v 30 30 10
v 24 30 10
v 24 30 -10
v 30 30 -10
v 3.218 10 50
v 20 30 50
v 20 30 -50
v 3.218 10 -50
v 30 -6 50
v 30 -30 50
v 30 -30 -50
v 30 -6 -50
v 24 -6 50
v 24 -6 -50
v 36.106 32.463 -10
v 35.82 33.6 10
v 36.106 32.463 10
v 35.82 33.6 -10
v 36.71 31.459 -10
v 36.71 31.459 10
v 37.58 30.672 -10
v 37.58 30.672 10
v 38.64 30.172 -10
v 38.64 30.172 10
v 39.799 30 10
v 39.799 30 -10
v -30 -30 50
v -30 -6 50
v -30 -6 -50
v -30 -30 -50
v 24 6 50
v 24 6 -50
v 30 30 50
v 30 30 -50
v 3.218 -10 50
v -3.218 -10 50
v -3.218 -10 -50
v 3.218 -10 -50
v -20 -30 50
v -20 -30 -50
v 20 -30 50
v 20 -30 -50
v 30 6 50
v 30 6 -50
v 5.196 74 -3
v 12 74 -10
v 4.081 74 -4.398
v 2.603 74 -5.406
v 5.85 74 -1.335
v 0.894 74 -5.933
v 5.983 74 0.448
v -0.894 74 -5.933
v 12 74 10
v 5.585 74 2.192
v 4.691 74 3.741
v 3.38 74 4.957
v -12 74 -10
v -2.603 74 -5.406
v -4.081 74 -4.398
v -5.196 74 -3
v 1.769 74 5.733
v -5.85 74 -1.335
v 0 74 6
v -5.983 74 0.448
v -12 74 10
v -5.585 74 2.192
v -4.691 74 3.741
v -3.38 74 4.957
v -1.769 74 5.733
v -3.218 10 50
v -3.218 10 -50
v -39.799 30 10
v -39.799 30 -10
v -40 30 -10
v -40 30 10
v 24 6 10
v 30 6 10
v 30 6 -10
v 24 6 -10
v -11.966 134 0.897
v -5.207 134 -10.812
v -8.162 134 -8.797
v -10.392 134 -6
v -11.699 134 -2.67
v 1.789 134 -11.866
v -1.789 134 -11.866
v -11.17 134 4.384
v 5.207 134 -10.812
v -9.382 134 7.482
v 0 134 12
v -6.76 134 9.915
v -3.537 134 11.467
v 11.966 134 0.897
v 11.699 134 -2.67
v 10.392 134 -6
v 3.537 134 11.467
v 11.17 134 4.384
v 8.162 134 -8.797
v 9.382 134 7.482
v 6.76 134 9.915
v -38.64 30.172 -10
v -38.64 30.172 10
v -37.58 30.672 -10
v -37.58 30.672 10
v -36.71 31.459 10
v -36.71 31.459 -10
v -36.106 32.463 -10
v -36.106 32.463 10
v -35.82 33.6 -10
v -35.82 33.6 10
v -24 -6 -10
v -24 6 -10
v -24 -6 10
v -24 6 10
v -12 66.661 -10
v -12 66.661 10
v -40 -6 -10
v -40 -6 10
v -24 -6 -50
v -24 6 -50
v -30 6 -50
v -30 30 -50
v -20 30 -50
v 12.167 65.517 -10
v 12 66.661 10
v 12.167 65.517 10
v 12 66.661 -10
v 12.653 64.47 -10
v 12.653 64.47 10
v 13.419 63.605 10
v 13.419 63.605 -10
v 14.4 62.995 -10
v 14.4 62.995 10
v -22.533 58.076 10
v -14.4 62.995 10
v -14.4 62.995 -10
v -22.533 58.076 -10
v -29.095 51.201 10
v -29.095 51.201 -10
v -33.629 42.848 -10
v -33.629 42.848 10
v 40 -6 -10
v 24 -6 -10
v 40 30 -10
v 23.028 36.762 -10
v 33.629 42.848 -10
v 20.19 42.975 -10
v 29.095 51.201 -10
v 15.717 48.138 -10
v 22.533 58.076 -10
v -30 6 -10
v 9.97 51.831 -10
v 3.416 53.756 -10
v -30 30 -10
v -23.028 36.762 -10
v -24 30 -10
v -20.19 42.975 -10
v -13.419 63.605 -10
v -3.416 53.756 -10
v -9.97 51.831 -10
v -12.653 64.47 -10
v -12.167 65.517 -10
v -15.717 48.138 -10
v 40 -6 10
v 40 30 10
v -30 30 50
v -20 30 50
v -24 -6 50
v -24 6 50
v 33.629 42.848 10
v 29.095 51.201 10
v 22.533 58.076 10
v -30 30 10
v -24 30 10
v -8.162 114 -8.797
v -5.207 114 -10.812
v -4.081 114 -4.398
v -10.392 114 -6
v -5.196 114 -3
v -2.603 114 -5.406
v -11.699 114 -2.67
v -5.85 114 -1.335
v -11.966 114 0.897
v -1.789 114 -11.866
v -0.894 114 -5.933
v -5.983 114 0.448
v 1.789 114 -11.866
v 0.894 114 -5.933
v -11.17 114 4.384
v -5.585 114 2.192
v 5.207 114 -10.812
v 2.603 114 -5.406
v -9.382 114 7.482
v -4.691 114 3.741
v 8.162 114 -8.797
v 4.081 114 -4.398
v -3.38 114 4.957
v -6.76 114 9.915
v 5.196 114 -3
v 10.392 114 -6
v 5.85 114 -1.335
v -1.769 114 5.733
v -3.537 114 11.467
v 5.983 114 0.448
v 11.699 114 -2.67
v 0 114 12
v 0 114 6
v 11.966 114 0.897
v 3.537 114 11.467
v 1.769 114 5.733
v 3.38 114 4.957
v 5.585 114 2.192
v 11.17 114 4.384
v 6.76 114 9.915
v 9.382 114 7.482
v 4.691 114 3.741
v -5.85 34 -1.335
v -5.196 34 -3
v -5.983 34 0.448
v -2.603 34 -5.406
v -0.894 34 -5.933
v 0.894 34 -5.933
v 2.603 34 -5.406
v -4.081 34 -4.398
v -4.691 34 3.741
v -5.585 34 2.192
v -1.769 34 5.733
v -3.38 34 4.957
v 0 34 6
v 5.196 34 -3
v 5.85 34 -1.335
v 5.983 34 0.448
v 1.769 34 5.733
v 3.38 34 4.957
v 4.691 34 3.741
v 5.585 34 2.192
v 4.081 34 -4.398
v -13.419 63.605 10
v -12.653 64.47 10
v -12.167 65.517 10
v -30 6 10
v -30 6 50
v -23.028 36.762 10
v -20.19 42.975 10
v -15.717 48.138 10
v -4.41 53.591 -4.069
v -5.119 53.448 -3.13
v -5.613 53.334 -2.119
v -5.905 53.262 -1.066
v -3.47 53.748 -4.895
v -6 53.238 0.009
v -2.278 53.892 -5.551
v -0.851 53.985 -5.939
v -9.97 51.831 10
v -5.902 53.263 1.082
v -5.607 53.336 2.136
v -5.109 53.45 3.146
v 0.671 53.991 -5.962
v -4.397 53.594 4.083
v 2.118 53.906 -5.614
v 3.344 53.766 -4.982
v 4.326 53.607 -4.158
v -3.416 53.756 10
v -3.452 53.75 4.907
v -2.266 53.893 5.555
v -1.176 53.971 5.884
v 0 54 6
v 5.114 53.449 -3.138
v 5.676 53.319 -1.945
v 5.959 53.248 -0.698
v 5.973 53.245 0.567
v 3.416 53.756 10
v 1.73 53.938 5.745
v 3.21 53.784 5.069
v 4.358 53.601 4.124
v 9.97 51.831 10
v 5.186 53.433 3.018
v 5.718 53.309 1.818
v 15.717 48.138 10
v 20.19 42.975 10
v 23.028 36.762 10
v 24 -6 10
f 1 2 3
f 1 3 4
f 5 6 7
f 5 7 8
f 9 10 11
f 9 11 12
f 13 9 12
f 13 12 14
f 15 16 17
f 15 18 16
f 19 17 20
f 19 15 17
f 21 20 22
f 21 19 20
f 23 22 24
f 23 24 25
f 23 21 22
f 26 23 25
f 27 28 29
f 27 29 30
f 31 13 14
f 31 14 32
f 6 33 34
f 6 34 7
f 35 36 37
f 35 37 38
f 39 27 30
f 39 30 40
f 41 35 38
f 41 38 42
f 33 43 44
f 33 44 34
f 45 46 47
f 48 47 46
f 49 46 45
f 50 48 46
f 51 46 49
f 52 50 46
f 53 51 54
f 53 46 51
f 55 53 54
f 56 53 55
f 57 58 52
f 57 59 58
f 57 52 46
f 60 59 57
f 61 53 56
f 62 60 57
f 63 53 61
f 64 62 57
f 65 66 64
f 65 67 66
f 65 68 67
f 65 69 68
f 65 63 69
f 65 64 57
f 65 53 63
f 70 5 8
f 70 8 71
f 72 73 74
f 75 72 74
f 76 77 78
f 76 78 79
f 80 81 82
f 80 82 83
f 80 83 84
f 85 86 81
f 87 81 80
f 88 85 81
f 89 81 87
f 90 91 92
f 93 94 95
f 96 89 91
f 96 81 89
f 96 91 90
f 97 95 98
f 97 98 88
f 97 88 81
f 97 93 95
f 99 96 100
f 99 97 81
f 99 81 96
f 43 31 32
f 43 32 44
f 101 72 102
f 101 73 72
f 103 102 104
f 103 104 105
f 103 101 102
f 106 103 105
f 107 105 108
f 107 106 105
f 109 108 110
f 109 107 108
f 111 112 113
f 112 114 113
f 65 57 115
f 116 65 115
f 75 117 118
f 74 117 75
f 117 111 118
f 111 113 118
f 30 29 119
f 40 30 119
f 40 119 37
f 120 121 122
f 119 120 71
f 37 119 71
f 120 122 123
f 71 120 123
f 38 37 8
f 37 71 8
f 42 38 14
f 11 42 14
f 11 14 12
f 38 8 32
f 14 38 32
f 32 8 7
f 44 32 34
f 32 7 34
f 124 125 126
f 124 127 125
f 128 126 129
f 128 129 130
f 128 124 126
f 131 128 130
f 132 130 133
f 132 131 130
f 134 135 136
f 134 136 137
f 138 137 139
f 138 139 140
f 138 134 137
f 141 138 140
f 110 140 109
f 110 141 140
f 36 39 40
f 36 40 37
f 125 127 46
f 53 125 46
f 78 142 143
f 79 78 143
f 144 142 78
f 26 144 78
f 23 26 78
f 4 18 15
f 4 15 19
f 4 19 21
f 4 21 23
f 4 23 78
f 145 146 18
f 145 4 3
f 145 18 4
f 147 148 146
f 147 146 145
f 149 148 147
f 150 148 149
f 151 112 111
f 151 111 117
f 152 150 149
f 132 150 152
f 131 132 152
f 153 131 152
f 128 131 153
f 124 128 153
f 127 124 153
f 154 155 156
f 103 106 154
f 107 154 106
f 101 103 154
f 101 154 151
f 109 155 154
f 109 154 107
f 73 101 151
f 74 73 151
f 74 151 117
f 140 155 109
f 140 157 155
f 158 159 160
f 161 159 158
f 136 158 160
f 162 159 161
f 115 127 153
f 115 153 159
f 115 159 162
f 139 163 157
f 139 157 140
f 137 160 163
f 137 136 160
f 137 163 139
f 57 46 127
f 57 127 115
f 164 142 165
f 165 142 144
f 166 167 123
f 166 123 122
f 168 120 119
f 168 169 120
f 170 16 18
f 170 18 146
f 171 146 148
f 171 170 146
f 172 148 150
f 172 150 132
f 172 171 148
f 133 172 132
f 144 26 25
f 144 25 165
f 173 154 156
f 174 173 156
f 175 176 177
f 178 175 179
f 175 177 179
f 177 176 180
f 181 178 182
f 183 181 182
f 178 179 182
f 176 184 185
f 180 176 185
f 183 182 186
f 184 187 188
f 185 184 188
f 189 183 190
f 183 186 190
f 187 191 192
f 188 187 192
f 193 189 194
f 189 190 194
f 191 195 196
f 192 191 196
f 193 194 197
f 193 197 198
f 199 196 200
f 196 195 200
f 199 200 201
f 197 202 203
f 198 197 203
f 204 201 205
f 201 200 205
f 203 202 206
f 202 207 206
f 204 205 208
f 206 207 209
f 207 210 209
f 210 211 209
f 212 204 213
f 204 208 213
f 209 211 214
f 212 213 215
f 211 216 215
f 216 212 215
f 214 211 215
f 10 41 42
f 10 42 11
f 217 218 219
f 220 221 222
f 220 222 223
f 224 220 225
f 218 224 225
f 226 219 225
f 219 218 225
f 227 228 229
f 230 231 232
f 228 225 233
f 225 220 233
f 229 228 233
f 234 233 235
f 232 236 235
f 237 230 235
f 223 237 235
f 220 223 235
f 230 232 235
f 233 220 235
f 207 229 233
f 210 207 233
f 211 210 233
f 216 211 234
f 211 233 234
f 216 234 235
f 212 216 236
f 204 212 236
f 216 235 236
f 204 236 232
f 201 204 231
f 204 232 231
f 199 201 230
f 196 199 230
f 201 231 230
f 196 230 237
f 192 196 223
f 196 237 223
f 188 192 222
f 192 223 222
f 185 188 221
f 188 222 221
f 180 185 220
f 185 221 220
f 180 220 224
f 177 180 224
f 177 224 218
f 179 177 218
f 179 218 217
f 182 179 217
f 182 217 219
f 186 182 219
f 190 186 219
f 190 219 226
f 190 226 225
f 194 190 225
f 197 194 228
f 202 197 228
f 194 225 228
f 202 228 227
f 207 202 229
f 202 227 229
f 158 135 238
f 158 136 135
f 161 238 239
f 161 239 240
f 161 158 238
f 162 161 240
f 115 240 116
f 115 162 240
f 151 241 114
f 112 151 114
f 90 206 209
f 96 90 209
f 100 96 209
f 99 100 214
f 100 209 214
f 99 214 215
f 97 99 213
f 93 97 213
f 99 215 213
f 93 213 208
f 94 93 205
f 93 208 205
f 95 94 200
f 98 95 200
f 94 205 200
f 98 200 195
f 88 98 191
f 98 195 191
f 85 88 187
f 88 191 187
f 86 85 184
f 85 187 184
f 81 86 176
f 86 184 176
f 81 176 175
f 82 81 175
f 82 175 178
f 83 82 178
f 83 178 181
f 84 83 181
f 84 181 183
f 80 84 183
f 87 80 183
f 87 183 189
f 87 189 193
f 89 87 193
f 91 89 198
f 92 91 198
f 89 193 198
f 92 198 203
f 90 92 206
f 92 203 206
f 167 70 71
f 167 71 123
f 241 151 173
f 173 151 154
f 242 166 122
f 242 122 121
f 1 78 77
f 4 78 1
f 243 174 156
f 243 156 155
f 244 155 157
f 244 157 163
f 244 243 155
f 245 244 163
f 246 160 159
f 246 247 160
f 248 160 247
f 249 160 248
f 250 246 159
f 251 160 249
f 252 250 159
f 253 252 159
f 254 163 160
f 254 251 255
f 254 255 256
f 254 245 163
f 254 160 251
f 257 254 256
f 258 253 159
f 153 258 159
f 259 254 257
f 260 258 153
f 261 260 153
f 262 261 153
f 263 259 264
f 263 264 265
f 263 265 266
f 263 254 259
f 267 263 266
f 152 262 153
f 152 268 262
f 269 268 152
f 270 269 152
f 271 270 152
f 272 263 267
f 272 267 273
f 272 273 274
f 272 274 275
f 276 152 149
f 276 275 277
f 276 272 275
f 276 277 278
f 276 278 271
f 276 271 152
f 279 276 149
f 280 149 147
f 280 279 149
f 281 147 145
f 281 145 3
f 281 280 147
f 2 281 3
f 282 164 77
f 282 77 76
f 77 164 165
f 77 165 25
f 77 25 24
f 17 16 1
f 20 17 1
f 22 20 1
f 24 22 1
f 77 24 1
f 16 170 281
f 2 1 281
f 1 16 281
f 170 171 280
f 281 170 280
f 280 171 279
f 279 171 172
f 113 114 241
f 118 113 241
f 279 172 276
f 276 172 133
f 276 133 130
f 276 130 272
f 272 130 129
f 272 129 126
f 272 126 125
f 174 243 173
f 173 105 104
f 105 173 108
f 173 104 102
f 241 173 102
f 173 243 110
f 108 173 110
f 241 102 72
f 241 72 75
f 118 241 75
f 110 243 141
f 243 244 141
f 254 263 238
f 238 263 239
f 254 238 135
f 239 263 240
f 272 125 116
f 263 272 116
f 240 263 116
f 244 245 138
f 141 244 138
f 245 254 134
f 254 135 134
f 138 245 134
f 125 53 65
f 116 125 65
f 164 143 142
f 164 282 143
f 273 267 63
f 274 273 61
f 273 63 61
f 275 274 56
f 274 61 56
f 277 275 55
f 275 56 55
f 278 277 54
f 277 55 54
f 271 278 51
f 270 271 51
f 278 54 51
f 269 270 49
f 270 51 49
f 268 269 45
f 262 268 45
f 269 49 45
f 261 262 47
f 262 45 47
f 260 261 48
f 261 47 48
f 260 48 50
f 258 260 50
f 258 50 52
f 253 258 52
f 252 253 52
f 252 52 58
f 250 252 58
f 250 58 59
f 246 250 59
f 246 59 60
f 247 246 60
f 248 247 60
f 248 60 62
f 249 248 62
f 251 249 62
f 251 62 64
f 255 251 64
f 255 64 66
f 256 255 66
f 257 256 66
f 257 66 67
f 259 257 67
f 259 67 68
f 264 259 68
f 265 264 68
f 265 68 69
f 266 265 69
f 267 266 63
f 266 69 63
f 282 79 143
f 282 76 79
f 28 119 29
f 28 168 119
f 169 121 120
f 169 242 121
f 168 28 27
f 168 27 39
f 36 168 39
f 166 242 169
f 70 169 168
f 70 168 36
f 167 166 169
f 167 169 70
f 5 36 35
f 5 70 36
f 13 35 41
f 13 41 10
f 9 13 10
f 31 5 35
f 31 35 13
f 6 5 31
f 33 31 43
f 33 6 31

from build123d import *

# Parameters (mm, degrees)
BOSS_EXTRUDE1_DEPTH      = 50
BOSS_EXTRUDE2_DEPTH      = 10
BOSS_EXTRUDE4_START      = -20
SKETCH4_W                = 10
SKETCH4_H                = 24
BOSS_EXTRUDE4_DEPTH      = 20
BOSS_EXTRUDE5_DEPTH      = 20
CUT_EXTRUDE1_REACH       = 124.131
CUT_EXTRUDE1_END_RADIUS  = 24
SKETCH6_R                = 6
FILLET1_R                = 4
BOSS_EXTRUDE6_DEPTH      = 40
BOSS_EXTRUDE6_DEPTH_BACK = 40
SKETCH7_R                = 6
SKETCH8_R                = 12
SKETCH8_R_2              = 6
BOSS_EXTRUDE7_DEPTH      = 20


with BuildPart() as part:
    # Sketch1 → Boss-Extrude1 (new, symmetric)
    with BuildSketch(Plane.XY):
        Polygon((24, 0), (-24, 0), (-24, -6), (-30, -6), (-30, -30), (-20, -30), (-3.218007376, -10), (3.218007376, -10), (20, -30), (30, -30), (30, -6), (24, -6), align=None)
        Polygon((3.218007376, 10), (-3.218007376, 10), (-20, 30), (-30, 30), (-30, 6), (-24, 6), (-24, 0), (24, 0), (24, 6), (30, 6), (30, 30), (20, 30), align=None)
    extrude(amount=BOSS_EXTRUDE1_DEPTH, both=True)


with BuildPart() as body_2:
    # Sketch2 → Boss-Extrude2 (new, symmetric)
    with BuildSketch(Plane.XY):
        Polygon((24, -6), (30, -6), (40, -6), (40, 6), (30, 6), (24, 6), align=None)
    extrude(amount=BOSS_EXTRUDE2_DEPTH, both=True)

    # Sketch4 → Boss-Extrude4 (add)
    with BuildSketch(Plane.XY.offset(10).offset(BOSS_EXTRUDE4_START)):
        with Locations((35, 18)):
            Rectangle(SKETCH4_W, SKETCH4_H)
    extrude(amount=BOSS_EXTRUDE4_DEPTH)


with BuildPart() as body_3:
    # Mirror2: mirrored copy
    add(body_2.part.mirror(Plane(origin=(0, 0, 0), x_dir=(0, 0, 1), z_dir=(1, 0, 0))))


with BuildPart() as body_2_1:
    add(body_2.part)

    # Sketch5 → Boss-Extrude5 (add)
    with BuildSketch(Plane.XY.offset(10)):
        with BuildLine():
            ThreePointArc((-12, 63.941125497), (-29.393876913, 50.784609691), (-36, 30))
            Line((-36, 30), (-30, 30))
            Line((-30, 30), (-24, 30))
            ThreePointArc((-24, 30), (0, 54), (24, 30))
            Line((24, 30), (30, 30))
            Line((30, 30), (36, 30))
            ThreePointArc((36, 30), (29.393876913, 50.784609691), (12, 63.941125497))
            Line((12, 63.941125497), (12, 74))
            Line((12, 74), (-12, 74))
            Line((-12, 74), (-12, 63.941125497))
        make_face()
    extrude(amount=-BOSS_EXTRUDE5_DEPTH)

    # Combine2: union body 3
    add(body_3.part)

    # Cut-Extrude1: up to this cylinder (the profile starts outside it)
    cut_extrude1_end = Plane(origin=(0, 30, 0), z_dir=(0, 0, 1)) * Cylinder(CUT_EXTRUDE1_END_RADIUS, 297.262, mode=Mode.PRIVATE)
    # Sketch6 → Cut-Extrude1 (cut, up to the surface)
    with BuildSketch(Plane(origin=(0, 74, 0), x_dir=(1, 0, 0), z_dir=(0, 1, 0)), mode=Mode.PRIVATE) as cut_extrude1_sk1:
        with Locations(Location((0, 0, 0), (0, 0, 270))):
            Circle(SKETCH6_R)
    cut_extrude1_tool1 = extrude(cut_extrude1_sk1.sketch, amount=-CUT_EXTRUDE1_REACH, mode=Mode.PRIVATE) - cut_extrude1_end
    add(cut_extrude1_tool1.solids().sort_by_distance((0, 74, 0))[0], mode=Mode.SUBTRACT)

    # Fillet1
    fillet1_edges = [body_2_1.edges().sort_by_distance(p)[0] for p in [
        (36, 30, 0),
        (-12, 63.941125497, 0),
        (12, 63.941125497, 0),
        (-36, 30, 0),
    ]]
    fillet(fillet1_edges, radius=FILLET1_R)


with BuildPart() as body_3_2:
    # Sketch7 → Boss-Extrude6 (new, two sides: drawn at the far end of the back side and taken through both)
    with BuildSketch(Plane(origin=(0, 74, 0), x_dir=(1, 0, 0), z_dir=(0, 1, 0)).offset(-BOSS_EXTRUDE6_DEPTH_BACK)):
        with Locations(Location((0, 0, 0), (0, 0, 270))):
            Circle(SKETCH7_R)
    extrude(amount=BOSS_EXTRUDE6_DEPTH + BOSS_EXTRUDE6_DEPTH_BACK)

    # Sketch8 → Boss-Extrude7 (add)
    # profile 1 of 2: a face of its own
    with BuildSketch(Plane(origin=(0, 114, 0), x_dir=(1, 0, 0), z_dir=(0, 1, 0))):
        with Locations(Location((0, 0, 0), (0, 0, 270))):
            Circle(SKETCH8_R)
        with Locations(Location((0, 0, 0), (0, 0, 270))):
            Circle(SKETCH8_R_2, mode=Mode.SUBTRACT)
    # profile 2 of 2: a face of its own
    with BuildSketch(Plane(origin=(0, 114, 0), x_dir=(1, 0, 0), z_dir=(0, 1, 0))):
        with Locations(Location((0, 0, 0), (0, 0, 270))):
            Circle(SKETCH8_R_2)
    extrude(amount=BOSS_EXTRUDE7_DEPTH)


solid = Compound([part.part, body_2_1.part, body_3_2.part])
